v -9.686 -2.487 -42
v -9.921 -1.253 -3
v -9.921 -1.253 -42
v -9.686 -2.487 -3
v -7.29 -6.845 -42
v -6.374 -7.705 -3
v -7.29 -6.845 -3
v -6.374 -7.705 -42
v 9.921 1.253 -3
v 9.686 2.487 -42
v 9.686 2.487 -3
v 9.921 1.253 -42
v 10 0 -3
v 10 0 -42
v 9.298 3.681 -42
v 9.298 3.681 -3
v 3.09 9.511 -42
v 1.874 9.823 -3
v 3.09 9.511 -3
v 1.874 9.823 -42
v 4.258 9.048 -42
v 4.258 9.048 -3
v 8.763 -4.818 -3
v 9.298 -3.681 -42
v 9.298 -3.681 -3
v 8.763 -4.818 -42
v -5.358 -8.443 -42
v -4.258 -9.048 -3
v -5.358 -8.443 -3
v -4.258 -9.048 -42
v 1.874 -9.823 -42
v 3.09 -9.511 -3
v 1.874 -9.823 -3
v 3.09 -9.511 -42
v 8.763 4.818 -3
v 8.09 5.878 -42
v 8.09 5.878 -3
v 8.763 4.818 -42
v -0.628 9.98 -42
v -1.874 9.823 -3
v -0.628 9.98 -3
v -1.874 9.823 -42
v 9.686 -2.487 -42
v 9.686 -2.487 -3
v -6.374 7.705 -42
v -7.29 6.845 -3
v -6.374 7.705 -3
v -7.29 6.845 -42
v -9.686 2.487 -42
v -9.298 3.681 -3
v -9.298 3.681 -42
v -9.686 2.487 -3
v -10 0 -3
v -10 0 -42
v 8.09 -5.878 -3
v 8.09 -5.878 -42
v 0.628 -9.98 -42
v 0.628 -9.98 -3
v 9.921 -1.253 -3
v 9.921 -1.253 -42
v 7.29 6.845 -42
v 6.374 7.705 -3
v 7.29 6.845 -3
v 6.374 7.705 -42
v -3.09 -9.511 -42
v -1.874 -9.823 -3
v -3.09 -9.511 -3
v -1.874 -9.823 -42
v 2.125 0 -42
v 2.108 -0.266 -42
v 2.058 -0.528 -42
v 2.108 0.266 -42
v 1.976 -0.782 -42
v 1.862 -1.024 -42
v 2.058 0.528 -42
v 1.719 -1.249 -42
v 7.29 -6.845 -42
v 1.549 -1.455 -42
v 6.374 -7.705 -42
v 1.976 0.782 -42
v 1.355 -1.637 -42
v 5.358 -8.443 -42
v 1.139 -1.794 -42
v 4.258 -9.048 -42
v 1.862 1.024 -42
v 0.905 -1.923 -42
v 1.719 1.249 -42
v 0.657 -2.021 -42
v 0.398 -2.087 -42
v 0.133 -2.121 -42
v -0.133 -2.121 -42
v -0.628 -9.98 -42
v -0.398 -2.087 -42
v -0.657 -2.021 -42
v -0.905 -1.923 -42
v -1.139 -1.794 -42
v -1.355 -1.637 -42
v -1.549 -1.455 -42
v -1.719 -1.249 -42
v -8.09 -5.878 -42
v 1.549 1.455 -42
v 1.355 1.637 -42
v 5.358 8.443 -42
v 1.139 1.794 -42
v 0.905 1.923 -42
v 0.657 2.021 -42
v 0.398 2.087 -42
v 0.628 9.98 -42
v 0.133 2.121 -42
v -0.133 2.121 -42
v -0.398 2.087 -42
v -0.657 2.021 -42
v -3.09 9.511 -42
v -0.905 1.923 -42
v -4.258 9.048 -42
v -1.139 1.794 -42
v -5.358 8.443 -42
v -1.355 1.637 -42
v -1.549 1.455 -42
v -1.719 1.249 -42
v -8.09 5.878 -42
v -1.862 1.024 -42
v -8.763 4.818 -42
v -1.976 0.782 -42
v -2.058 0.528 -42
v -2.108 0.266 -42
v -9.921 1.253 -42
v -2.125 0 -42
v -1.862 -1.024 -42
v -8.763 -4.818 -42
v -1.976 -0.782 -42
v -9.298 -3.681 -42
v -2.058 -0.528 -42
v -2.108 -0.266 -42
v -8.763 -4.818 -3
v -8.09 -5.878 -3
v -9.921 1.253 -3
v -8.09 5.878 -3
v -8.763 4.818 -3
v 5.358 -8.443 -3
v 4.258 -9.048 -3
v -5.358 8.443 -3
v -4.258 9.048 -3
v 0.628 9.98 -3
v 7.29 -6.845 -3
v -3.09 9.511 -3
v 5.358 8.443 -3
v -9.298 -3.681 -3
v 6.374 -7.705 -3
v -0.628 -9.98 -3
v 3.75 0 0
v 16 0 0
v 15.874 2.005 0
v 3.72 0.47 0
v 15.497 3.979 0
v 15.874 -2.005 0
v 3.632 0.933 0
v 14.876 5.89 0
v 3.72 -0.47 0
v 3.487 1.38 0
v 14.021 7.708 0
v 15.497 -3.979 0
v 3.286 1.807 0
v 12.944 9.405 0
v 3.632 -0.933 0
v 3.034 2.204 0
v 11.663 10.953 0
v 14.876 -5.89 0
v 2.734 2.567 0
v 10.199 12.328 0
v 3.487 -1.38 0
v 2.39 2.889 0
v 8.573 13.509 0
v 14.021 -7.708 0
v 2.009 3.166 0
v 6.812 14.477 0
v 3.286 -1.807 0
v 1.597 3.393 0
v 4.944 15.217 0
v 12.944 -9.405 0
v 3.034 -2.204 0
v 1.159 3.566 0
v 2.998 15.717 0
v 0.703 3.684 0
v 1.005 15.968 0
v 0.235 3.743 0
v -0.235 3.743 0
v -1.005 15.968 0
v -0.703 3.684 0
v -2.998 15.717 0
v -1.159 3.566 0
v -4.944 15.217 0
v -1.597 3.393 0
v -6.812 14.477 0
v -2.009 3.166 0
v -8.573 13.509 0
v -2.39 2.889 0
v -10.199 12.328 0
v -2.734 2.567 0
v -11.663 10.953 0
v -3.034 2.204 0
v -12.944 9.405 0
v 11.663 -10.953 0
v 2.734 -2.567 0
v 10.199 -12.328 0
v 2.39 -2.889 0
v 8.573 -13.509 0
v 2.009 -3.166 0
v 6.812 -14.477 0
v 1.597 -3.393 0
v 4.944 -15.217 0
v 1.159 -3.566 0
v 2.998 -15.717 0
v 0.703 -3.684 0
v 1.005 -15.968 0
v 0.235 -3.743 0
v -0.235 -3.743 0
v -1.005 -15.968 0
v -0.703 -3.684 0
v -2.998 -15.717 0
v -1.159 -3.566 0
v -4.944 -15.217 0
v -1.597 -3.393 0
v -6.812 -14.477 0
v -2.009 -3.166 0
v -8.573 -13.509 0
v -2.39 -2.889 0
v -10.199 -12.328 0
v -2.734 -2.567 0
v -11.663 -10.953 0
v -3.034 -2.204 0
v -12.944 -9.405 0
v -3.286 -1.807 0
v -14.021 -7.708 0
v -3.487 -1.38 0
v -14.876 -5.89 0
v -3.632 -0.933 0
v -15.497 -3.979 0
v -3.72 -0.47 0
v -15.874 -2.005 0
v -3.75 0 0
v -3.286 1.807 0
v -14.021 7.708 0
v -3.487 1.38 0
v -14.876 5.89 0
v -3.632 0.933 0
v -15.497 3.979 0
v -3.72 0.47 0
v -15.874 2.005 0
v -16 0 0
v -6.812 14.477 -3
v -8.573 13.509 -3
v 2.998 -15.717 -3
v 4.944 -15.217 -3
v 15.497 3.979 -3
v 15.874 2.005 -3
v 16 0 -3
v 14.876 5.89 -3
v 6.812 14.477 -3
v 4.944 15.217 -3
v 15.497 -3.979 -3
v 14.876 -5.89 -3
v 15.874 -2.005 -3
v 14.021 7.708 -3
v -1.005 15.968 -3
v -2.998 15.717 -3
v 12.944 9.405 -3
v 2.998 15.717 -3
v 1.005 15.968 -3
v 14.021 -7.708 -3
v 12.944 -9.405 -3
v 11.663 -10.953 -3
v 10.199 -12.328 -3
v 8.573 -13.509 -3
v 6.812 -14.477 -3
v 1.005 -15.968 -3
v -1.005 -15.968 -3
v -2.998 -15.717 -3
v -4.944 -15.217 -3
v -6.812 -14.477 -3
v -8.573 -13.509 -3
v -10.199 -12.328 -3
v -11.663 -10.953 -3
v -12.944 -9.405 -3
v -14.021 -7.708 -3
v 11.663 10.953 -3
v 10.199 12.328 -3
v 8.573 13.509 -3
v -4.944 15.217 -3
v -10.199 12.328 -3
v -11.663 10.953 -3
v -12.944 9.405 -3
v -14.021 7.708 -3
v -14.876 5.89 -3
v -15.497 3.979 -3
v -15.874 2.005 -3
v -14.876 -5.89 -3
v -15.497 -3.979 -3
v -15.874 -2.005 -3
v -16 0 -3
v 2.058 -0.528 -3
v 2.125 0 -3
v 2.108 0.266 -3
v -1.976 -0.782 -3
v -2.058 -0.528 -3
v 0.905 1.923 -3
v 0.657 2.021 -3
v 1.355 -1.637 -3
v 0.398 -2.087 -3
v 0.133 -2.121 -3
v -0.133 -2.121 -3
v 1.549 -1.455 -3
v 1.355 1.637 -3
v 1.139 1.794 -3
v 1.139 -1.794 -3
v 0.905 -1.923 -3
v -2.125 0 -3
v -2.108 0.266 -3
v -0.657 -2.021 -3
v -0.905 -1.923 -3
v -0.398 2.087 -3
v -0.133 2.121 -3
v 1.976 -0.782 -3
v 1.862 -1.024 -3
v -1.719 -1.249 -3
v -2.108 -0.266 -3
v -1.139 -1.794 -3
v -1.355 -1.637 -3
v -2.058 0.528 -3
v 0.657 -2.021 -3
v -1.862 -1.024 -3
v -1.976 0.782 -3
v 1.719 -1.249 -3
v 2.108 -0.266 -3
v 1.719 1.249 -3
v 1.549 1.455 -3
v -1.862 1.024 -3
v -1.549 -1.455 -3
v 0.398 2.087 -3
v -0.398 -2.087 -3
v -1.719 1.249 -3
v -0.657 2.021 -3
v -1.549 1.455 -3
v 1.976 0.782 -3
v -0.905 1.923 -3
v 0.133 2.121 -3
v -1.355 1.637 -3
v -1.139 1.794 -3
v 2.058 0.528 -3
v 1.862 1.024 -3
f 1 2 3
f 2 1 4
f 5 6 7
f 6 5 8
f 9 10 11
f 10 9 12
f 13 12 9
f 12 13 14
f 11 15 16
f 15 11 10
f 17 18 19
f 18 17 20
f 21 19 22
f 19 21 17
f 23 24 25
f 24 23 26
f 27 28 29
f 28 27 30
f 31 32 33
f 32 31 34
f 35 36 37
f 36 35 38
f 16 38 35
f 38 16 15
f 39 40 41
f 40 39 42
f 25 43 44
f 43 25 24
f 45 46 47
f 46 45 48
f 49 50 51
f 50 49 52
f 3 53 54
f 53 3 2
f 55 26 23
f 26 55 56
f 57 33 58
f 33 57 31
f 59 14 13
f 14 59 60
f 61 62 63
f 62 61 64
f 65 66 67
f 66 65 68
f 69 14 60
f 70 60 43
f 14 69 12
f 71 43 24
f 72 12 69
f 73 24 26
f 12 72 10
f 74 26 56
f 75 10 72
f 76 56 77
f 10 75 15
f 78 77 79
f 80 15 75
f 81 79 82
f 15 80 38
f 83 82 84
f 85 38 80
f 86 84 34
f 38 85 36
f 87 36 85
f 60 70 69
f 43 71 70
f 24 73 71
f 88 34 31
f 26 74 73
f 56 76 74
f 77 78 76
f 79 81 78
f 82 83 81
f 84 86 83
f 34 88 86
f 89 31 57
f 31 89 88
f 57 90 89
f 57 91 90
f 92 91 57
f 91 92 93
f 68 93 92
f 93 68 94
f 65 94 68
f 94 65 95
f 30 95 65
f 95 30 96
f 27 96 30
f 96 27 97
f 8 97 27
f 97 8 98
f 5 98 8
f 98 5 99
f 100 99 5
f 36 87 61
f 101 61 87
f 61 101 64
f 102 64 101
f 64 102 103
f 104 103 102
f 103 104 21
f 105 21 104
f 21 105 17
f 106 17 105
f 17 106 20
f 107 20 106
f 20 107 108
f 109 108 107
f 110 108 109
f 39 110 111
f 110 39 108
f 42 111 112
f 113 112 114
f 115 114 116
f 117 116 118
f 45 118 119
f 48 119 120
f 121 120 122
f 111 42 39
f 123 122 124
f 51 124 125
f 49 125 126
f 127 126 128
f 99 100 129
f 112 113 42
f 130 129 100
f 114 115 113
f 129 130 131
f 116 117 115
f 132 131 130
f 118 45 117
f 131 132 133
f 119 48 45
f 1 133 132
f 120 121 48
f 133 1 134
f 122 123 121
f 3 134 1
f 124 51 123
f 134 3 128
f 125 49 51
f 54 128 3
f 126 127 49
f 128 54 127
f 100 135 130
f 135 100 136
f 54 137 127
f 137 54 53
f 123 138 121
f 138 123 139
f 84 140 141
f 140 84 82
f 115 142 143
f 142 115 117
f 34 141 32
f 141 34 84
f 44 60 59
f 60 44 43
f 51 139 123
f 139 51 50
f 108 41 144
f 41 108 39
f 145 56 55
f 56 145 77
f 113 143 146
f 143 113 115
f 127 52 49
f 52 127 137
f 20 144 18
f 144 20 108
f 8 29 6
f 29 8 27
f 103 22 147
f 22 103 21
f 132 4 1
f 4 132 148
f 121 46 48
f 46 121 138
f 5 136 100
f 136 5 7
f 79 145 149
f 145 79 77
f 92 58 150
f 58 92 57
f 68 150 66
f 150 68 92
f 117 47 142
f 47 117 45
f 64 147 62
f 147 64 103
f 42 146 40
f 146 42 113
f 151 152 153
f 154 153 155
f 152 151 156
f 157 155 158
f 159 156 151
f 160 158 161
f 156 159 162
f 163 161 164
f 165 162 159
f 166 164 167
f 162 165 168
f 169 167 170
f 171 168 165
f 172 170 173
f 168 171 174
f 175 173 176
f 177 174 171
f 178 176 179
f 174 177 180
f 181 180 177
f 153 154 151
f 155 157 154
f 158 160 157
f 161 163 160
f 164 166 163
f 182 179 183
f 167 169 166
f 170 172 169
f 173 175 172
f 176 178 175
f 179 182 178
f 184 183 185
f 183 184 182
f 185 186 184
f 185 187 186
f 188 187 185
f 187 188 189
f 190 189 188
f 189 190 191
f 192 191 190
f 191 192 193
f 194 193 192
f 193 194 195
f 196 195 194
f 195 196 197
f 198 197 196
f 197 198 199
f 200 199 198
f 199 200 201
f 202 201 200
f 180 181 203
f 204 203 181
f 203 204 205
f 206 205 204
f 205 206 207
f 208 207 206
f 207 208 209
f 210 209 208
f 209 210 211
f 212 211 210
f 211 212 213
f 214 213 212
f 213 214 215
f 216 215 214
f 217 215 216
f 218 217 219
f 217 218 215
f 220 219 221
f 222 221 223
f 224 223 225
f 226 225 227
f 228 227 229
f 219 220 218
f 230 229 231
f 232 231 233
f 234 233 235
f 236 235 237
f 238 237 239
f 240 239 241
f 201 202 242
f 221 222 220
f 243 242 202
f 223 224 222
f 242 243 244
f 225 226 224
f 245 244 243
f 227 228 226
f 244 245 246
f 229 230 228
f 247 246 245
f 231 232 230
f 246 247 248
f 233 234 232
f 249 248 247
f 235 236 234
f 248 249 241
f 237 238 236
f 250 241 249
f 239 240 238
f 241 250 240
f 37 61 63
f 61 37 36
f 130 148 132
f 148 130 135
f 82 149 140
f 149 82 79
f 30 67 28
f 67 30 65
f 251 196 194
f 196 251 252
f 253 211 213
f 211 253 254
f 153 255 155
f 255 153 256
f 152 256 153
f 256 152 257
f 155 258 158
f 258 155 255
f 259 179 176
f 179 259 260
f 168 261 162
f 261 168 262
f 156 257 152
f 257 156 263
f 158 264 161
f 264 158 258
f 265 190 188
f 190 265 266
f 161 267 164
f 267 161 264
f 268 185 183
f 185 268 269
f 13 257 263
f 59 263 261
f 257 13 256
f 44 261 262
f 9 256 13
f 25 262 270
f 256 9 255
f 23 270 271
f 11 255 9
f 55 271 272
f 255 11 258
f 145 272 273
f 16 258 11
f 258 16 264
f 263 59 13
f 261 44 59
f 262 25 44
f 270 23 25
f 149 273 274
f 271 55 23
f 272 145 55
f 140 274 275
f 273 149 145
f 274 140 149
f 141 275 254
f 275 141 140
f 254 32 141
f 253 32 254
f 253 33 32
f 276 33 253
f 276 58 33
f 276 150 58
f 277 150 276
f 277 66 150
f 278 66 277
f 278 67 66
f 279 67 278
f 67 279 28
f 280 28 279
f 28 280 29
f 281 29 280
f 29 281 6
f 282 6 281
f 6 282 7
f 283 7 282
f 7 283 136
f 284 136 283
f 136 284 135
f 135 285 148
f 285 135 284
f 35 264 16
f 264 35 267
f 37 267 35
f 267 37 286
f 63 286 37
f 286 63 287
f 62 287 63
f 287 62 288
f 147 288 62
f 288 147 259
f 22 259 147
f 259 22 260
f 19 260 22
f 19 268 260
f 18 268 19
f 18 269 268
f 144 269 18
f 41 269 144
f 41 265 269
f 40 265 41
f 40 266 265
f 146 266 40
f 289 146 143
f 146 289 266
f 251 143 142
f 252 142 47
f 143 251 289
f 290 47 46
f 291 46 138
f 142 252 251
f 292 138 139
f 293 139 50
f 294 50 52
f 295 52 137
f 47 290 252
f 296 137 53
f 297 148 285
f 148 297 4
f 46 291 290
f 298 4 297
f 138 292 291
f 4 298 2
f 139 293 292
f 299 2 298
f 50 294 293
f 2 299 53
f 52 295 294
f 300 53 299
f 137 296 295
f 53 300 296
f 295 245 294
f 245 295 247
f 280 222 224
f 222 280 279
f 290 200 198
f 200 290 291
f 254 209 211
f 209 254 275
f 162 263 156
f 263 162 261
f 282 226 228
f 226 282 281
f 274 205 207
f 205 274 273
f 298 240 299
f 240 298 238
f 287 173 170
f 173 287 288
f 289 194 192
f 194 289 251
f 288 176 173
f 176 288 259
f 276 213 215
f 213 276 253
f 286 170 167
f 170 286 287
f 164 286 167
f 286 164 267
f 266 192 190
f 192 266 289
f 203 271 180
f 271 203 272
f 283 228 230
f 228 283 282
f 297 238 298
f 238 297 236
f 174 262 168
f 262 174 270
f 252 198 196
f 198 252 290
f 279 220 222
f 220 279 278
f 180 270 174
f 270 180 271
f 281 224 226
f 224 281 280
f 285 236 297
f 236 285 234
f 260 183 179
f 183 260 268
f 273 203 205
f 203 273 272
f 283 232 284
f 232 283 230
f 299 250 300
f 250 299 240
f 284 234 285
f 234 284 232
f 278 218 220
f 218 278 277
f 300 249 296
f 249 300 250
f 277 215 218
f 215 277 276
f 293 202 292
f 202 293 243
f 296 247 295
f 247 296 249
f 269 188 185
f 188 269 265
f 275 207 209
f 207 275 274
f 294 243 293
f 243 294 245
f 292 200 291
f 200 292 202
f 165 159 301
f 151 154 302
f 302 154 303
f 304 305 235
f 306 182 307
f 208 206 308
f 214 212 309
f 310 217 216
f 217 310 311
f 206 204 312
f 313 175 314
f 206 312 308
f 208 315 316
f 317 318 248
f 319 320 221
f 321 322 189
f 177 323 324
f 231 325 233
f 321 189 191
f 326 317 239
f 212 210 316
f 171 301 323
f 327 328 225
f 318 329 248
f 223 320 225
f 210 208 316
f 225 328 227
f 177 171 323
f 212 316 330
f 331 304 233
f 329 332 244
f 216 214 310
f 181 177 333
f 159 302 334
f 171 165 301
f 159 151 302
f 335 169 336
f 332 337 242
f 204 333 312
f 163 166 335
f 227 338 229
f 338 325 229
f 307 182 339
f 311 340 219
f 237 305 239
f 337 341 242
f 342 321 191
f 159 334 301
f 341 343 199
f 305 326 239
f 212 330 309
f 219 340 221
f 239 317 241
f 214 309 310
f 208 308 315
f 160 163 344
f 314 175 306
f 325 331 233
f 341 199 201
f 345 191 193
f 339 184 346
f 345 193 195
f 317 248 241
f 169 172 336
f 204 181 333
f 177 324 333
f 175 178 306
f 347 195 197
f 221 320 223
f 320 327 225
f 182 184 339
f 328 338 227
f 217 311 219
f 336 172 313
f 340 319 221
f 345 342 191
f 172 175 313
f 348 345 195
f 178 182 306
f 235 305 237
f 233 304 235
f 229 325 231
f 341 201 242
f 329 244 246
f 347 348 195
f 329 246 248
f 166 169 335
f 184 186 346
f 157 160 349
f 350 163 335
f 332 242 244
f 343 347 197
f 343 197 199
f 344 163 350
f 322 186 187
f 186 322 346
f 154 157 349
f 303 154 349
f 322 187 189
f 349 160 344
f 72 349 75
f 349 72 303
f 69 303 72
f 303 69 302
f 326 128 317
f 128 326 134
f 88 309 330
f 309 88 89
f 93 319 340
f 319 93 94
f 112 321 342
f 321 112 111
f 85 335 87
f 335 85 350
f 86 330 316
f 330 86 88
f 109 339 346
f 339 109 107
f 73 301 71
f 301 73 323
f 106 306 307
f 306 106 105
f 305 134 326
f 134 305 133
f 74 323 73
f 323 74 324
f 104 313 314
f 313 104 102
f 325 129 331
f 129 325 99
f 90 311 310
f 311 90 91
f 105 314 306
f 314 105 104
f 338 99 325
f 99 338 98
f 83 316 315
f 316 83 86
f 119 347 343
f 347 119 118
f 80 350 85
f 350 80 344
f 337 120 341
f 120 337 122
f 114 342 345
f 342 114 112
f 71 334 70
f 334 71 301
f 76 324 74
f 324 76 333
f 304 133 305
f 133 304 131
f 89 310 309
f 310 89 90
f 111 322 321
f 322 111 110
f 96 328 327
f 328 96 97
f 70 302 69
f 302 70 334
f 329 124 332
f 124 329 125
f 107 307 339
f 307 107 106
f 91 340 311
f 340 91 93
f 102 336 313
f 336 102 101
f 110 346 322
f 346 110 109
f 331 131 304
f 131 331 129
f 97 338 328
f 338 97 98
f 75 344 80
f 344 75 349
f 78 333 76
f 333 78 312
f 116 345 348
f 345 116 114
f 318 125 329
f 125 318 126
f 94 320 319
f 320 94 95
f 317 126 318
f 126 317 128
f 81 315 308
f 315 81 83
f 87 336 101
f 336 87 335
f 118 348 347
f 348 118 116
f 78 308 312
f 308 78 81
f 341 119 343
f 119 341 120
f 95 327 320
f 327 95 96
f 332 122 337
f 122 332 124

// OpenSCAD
$fn = 50;


difference() {
	union() {
		translate(v = [0, 0, -42.0000000000]) {
			cylinder(h = 42, r = 10.0000000000);
		}
		translate(v = [0, 0, -3.0000000000]) {
			cylinder(h = 3, r = 16.0000000000);
		}
	}
	union() {
		translate(v = [0, 0, 0]) {
			rotate(a = [0, 0, 0]) {
				difference() {
					union() {
						#translate(v = [0, 0, -42.0000000000]) {
							cylinder(h = 42, r = 2.0000000000);
						}
						#translate(v = [0, 0, -3]) {
							cylinder(h = 3, r1 = 2.1250000000, r2 = 3.7500000000);
						}
						#translate(v = [0, 0, -42.0000000000]) {
							cylinder(h = 42, r = 2.1250000000);
						}
						#translate(v = [0, 0, -42.0000000000]) {
							cylinder(h = 42, r = 2.0000000000);
						}
					}
					union();
				}
			}
		}
	}
}
